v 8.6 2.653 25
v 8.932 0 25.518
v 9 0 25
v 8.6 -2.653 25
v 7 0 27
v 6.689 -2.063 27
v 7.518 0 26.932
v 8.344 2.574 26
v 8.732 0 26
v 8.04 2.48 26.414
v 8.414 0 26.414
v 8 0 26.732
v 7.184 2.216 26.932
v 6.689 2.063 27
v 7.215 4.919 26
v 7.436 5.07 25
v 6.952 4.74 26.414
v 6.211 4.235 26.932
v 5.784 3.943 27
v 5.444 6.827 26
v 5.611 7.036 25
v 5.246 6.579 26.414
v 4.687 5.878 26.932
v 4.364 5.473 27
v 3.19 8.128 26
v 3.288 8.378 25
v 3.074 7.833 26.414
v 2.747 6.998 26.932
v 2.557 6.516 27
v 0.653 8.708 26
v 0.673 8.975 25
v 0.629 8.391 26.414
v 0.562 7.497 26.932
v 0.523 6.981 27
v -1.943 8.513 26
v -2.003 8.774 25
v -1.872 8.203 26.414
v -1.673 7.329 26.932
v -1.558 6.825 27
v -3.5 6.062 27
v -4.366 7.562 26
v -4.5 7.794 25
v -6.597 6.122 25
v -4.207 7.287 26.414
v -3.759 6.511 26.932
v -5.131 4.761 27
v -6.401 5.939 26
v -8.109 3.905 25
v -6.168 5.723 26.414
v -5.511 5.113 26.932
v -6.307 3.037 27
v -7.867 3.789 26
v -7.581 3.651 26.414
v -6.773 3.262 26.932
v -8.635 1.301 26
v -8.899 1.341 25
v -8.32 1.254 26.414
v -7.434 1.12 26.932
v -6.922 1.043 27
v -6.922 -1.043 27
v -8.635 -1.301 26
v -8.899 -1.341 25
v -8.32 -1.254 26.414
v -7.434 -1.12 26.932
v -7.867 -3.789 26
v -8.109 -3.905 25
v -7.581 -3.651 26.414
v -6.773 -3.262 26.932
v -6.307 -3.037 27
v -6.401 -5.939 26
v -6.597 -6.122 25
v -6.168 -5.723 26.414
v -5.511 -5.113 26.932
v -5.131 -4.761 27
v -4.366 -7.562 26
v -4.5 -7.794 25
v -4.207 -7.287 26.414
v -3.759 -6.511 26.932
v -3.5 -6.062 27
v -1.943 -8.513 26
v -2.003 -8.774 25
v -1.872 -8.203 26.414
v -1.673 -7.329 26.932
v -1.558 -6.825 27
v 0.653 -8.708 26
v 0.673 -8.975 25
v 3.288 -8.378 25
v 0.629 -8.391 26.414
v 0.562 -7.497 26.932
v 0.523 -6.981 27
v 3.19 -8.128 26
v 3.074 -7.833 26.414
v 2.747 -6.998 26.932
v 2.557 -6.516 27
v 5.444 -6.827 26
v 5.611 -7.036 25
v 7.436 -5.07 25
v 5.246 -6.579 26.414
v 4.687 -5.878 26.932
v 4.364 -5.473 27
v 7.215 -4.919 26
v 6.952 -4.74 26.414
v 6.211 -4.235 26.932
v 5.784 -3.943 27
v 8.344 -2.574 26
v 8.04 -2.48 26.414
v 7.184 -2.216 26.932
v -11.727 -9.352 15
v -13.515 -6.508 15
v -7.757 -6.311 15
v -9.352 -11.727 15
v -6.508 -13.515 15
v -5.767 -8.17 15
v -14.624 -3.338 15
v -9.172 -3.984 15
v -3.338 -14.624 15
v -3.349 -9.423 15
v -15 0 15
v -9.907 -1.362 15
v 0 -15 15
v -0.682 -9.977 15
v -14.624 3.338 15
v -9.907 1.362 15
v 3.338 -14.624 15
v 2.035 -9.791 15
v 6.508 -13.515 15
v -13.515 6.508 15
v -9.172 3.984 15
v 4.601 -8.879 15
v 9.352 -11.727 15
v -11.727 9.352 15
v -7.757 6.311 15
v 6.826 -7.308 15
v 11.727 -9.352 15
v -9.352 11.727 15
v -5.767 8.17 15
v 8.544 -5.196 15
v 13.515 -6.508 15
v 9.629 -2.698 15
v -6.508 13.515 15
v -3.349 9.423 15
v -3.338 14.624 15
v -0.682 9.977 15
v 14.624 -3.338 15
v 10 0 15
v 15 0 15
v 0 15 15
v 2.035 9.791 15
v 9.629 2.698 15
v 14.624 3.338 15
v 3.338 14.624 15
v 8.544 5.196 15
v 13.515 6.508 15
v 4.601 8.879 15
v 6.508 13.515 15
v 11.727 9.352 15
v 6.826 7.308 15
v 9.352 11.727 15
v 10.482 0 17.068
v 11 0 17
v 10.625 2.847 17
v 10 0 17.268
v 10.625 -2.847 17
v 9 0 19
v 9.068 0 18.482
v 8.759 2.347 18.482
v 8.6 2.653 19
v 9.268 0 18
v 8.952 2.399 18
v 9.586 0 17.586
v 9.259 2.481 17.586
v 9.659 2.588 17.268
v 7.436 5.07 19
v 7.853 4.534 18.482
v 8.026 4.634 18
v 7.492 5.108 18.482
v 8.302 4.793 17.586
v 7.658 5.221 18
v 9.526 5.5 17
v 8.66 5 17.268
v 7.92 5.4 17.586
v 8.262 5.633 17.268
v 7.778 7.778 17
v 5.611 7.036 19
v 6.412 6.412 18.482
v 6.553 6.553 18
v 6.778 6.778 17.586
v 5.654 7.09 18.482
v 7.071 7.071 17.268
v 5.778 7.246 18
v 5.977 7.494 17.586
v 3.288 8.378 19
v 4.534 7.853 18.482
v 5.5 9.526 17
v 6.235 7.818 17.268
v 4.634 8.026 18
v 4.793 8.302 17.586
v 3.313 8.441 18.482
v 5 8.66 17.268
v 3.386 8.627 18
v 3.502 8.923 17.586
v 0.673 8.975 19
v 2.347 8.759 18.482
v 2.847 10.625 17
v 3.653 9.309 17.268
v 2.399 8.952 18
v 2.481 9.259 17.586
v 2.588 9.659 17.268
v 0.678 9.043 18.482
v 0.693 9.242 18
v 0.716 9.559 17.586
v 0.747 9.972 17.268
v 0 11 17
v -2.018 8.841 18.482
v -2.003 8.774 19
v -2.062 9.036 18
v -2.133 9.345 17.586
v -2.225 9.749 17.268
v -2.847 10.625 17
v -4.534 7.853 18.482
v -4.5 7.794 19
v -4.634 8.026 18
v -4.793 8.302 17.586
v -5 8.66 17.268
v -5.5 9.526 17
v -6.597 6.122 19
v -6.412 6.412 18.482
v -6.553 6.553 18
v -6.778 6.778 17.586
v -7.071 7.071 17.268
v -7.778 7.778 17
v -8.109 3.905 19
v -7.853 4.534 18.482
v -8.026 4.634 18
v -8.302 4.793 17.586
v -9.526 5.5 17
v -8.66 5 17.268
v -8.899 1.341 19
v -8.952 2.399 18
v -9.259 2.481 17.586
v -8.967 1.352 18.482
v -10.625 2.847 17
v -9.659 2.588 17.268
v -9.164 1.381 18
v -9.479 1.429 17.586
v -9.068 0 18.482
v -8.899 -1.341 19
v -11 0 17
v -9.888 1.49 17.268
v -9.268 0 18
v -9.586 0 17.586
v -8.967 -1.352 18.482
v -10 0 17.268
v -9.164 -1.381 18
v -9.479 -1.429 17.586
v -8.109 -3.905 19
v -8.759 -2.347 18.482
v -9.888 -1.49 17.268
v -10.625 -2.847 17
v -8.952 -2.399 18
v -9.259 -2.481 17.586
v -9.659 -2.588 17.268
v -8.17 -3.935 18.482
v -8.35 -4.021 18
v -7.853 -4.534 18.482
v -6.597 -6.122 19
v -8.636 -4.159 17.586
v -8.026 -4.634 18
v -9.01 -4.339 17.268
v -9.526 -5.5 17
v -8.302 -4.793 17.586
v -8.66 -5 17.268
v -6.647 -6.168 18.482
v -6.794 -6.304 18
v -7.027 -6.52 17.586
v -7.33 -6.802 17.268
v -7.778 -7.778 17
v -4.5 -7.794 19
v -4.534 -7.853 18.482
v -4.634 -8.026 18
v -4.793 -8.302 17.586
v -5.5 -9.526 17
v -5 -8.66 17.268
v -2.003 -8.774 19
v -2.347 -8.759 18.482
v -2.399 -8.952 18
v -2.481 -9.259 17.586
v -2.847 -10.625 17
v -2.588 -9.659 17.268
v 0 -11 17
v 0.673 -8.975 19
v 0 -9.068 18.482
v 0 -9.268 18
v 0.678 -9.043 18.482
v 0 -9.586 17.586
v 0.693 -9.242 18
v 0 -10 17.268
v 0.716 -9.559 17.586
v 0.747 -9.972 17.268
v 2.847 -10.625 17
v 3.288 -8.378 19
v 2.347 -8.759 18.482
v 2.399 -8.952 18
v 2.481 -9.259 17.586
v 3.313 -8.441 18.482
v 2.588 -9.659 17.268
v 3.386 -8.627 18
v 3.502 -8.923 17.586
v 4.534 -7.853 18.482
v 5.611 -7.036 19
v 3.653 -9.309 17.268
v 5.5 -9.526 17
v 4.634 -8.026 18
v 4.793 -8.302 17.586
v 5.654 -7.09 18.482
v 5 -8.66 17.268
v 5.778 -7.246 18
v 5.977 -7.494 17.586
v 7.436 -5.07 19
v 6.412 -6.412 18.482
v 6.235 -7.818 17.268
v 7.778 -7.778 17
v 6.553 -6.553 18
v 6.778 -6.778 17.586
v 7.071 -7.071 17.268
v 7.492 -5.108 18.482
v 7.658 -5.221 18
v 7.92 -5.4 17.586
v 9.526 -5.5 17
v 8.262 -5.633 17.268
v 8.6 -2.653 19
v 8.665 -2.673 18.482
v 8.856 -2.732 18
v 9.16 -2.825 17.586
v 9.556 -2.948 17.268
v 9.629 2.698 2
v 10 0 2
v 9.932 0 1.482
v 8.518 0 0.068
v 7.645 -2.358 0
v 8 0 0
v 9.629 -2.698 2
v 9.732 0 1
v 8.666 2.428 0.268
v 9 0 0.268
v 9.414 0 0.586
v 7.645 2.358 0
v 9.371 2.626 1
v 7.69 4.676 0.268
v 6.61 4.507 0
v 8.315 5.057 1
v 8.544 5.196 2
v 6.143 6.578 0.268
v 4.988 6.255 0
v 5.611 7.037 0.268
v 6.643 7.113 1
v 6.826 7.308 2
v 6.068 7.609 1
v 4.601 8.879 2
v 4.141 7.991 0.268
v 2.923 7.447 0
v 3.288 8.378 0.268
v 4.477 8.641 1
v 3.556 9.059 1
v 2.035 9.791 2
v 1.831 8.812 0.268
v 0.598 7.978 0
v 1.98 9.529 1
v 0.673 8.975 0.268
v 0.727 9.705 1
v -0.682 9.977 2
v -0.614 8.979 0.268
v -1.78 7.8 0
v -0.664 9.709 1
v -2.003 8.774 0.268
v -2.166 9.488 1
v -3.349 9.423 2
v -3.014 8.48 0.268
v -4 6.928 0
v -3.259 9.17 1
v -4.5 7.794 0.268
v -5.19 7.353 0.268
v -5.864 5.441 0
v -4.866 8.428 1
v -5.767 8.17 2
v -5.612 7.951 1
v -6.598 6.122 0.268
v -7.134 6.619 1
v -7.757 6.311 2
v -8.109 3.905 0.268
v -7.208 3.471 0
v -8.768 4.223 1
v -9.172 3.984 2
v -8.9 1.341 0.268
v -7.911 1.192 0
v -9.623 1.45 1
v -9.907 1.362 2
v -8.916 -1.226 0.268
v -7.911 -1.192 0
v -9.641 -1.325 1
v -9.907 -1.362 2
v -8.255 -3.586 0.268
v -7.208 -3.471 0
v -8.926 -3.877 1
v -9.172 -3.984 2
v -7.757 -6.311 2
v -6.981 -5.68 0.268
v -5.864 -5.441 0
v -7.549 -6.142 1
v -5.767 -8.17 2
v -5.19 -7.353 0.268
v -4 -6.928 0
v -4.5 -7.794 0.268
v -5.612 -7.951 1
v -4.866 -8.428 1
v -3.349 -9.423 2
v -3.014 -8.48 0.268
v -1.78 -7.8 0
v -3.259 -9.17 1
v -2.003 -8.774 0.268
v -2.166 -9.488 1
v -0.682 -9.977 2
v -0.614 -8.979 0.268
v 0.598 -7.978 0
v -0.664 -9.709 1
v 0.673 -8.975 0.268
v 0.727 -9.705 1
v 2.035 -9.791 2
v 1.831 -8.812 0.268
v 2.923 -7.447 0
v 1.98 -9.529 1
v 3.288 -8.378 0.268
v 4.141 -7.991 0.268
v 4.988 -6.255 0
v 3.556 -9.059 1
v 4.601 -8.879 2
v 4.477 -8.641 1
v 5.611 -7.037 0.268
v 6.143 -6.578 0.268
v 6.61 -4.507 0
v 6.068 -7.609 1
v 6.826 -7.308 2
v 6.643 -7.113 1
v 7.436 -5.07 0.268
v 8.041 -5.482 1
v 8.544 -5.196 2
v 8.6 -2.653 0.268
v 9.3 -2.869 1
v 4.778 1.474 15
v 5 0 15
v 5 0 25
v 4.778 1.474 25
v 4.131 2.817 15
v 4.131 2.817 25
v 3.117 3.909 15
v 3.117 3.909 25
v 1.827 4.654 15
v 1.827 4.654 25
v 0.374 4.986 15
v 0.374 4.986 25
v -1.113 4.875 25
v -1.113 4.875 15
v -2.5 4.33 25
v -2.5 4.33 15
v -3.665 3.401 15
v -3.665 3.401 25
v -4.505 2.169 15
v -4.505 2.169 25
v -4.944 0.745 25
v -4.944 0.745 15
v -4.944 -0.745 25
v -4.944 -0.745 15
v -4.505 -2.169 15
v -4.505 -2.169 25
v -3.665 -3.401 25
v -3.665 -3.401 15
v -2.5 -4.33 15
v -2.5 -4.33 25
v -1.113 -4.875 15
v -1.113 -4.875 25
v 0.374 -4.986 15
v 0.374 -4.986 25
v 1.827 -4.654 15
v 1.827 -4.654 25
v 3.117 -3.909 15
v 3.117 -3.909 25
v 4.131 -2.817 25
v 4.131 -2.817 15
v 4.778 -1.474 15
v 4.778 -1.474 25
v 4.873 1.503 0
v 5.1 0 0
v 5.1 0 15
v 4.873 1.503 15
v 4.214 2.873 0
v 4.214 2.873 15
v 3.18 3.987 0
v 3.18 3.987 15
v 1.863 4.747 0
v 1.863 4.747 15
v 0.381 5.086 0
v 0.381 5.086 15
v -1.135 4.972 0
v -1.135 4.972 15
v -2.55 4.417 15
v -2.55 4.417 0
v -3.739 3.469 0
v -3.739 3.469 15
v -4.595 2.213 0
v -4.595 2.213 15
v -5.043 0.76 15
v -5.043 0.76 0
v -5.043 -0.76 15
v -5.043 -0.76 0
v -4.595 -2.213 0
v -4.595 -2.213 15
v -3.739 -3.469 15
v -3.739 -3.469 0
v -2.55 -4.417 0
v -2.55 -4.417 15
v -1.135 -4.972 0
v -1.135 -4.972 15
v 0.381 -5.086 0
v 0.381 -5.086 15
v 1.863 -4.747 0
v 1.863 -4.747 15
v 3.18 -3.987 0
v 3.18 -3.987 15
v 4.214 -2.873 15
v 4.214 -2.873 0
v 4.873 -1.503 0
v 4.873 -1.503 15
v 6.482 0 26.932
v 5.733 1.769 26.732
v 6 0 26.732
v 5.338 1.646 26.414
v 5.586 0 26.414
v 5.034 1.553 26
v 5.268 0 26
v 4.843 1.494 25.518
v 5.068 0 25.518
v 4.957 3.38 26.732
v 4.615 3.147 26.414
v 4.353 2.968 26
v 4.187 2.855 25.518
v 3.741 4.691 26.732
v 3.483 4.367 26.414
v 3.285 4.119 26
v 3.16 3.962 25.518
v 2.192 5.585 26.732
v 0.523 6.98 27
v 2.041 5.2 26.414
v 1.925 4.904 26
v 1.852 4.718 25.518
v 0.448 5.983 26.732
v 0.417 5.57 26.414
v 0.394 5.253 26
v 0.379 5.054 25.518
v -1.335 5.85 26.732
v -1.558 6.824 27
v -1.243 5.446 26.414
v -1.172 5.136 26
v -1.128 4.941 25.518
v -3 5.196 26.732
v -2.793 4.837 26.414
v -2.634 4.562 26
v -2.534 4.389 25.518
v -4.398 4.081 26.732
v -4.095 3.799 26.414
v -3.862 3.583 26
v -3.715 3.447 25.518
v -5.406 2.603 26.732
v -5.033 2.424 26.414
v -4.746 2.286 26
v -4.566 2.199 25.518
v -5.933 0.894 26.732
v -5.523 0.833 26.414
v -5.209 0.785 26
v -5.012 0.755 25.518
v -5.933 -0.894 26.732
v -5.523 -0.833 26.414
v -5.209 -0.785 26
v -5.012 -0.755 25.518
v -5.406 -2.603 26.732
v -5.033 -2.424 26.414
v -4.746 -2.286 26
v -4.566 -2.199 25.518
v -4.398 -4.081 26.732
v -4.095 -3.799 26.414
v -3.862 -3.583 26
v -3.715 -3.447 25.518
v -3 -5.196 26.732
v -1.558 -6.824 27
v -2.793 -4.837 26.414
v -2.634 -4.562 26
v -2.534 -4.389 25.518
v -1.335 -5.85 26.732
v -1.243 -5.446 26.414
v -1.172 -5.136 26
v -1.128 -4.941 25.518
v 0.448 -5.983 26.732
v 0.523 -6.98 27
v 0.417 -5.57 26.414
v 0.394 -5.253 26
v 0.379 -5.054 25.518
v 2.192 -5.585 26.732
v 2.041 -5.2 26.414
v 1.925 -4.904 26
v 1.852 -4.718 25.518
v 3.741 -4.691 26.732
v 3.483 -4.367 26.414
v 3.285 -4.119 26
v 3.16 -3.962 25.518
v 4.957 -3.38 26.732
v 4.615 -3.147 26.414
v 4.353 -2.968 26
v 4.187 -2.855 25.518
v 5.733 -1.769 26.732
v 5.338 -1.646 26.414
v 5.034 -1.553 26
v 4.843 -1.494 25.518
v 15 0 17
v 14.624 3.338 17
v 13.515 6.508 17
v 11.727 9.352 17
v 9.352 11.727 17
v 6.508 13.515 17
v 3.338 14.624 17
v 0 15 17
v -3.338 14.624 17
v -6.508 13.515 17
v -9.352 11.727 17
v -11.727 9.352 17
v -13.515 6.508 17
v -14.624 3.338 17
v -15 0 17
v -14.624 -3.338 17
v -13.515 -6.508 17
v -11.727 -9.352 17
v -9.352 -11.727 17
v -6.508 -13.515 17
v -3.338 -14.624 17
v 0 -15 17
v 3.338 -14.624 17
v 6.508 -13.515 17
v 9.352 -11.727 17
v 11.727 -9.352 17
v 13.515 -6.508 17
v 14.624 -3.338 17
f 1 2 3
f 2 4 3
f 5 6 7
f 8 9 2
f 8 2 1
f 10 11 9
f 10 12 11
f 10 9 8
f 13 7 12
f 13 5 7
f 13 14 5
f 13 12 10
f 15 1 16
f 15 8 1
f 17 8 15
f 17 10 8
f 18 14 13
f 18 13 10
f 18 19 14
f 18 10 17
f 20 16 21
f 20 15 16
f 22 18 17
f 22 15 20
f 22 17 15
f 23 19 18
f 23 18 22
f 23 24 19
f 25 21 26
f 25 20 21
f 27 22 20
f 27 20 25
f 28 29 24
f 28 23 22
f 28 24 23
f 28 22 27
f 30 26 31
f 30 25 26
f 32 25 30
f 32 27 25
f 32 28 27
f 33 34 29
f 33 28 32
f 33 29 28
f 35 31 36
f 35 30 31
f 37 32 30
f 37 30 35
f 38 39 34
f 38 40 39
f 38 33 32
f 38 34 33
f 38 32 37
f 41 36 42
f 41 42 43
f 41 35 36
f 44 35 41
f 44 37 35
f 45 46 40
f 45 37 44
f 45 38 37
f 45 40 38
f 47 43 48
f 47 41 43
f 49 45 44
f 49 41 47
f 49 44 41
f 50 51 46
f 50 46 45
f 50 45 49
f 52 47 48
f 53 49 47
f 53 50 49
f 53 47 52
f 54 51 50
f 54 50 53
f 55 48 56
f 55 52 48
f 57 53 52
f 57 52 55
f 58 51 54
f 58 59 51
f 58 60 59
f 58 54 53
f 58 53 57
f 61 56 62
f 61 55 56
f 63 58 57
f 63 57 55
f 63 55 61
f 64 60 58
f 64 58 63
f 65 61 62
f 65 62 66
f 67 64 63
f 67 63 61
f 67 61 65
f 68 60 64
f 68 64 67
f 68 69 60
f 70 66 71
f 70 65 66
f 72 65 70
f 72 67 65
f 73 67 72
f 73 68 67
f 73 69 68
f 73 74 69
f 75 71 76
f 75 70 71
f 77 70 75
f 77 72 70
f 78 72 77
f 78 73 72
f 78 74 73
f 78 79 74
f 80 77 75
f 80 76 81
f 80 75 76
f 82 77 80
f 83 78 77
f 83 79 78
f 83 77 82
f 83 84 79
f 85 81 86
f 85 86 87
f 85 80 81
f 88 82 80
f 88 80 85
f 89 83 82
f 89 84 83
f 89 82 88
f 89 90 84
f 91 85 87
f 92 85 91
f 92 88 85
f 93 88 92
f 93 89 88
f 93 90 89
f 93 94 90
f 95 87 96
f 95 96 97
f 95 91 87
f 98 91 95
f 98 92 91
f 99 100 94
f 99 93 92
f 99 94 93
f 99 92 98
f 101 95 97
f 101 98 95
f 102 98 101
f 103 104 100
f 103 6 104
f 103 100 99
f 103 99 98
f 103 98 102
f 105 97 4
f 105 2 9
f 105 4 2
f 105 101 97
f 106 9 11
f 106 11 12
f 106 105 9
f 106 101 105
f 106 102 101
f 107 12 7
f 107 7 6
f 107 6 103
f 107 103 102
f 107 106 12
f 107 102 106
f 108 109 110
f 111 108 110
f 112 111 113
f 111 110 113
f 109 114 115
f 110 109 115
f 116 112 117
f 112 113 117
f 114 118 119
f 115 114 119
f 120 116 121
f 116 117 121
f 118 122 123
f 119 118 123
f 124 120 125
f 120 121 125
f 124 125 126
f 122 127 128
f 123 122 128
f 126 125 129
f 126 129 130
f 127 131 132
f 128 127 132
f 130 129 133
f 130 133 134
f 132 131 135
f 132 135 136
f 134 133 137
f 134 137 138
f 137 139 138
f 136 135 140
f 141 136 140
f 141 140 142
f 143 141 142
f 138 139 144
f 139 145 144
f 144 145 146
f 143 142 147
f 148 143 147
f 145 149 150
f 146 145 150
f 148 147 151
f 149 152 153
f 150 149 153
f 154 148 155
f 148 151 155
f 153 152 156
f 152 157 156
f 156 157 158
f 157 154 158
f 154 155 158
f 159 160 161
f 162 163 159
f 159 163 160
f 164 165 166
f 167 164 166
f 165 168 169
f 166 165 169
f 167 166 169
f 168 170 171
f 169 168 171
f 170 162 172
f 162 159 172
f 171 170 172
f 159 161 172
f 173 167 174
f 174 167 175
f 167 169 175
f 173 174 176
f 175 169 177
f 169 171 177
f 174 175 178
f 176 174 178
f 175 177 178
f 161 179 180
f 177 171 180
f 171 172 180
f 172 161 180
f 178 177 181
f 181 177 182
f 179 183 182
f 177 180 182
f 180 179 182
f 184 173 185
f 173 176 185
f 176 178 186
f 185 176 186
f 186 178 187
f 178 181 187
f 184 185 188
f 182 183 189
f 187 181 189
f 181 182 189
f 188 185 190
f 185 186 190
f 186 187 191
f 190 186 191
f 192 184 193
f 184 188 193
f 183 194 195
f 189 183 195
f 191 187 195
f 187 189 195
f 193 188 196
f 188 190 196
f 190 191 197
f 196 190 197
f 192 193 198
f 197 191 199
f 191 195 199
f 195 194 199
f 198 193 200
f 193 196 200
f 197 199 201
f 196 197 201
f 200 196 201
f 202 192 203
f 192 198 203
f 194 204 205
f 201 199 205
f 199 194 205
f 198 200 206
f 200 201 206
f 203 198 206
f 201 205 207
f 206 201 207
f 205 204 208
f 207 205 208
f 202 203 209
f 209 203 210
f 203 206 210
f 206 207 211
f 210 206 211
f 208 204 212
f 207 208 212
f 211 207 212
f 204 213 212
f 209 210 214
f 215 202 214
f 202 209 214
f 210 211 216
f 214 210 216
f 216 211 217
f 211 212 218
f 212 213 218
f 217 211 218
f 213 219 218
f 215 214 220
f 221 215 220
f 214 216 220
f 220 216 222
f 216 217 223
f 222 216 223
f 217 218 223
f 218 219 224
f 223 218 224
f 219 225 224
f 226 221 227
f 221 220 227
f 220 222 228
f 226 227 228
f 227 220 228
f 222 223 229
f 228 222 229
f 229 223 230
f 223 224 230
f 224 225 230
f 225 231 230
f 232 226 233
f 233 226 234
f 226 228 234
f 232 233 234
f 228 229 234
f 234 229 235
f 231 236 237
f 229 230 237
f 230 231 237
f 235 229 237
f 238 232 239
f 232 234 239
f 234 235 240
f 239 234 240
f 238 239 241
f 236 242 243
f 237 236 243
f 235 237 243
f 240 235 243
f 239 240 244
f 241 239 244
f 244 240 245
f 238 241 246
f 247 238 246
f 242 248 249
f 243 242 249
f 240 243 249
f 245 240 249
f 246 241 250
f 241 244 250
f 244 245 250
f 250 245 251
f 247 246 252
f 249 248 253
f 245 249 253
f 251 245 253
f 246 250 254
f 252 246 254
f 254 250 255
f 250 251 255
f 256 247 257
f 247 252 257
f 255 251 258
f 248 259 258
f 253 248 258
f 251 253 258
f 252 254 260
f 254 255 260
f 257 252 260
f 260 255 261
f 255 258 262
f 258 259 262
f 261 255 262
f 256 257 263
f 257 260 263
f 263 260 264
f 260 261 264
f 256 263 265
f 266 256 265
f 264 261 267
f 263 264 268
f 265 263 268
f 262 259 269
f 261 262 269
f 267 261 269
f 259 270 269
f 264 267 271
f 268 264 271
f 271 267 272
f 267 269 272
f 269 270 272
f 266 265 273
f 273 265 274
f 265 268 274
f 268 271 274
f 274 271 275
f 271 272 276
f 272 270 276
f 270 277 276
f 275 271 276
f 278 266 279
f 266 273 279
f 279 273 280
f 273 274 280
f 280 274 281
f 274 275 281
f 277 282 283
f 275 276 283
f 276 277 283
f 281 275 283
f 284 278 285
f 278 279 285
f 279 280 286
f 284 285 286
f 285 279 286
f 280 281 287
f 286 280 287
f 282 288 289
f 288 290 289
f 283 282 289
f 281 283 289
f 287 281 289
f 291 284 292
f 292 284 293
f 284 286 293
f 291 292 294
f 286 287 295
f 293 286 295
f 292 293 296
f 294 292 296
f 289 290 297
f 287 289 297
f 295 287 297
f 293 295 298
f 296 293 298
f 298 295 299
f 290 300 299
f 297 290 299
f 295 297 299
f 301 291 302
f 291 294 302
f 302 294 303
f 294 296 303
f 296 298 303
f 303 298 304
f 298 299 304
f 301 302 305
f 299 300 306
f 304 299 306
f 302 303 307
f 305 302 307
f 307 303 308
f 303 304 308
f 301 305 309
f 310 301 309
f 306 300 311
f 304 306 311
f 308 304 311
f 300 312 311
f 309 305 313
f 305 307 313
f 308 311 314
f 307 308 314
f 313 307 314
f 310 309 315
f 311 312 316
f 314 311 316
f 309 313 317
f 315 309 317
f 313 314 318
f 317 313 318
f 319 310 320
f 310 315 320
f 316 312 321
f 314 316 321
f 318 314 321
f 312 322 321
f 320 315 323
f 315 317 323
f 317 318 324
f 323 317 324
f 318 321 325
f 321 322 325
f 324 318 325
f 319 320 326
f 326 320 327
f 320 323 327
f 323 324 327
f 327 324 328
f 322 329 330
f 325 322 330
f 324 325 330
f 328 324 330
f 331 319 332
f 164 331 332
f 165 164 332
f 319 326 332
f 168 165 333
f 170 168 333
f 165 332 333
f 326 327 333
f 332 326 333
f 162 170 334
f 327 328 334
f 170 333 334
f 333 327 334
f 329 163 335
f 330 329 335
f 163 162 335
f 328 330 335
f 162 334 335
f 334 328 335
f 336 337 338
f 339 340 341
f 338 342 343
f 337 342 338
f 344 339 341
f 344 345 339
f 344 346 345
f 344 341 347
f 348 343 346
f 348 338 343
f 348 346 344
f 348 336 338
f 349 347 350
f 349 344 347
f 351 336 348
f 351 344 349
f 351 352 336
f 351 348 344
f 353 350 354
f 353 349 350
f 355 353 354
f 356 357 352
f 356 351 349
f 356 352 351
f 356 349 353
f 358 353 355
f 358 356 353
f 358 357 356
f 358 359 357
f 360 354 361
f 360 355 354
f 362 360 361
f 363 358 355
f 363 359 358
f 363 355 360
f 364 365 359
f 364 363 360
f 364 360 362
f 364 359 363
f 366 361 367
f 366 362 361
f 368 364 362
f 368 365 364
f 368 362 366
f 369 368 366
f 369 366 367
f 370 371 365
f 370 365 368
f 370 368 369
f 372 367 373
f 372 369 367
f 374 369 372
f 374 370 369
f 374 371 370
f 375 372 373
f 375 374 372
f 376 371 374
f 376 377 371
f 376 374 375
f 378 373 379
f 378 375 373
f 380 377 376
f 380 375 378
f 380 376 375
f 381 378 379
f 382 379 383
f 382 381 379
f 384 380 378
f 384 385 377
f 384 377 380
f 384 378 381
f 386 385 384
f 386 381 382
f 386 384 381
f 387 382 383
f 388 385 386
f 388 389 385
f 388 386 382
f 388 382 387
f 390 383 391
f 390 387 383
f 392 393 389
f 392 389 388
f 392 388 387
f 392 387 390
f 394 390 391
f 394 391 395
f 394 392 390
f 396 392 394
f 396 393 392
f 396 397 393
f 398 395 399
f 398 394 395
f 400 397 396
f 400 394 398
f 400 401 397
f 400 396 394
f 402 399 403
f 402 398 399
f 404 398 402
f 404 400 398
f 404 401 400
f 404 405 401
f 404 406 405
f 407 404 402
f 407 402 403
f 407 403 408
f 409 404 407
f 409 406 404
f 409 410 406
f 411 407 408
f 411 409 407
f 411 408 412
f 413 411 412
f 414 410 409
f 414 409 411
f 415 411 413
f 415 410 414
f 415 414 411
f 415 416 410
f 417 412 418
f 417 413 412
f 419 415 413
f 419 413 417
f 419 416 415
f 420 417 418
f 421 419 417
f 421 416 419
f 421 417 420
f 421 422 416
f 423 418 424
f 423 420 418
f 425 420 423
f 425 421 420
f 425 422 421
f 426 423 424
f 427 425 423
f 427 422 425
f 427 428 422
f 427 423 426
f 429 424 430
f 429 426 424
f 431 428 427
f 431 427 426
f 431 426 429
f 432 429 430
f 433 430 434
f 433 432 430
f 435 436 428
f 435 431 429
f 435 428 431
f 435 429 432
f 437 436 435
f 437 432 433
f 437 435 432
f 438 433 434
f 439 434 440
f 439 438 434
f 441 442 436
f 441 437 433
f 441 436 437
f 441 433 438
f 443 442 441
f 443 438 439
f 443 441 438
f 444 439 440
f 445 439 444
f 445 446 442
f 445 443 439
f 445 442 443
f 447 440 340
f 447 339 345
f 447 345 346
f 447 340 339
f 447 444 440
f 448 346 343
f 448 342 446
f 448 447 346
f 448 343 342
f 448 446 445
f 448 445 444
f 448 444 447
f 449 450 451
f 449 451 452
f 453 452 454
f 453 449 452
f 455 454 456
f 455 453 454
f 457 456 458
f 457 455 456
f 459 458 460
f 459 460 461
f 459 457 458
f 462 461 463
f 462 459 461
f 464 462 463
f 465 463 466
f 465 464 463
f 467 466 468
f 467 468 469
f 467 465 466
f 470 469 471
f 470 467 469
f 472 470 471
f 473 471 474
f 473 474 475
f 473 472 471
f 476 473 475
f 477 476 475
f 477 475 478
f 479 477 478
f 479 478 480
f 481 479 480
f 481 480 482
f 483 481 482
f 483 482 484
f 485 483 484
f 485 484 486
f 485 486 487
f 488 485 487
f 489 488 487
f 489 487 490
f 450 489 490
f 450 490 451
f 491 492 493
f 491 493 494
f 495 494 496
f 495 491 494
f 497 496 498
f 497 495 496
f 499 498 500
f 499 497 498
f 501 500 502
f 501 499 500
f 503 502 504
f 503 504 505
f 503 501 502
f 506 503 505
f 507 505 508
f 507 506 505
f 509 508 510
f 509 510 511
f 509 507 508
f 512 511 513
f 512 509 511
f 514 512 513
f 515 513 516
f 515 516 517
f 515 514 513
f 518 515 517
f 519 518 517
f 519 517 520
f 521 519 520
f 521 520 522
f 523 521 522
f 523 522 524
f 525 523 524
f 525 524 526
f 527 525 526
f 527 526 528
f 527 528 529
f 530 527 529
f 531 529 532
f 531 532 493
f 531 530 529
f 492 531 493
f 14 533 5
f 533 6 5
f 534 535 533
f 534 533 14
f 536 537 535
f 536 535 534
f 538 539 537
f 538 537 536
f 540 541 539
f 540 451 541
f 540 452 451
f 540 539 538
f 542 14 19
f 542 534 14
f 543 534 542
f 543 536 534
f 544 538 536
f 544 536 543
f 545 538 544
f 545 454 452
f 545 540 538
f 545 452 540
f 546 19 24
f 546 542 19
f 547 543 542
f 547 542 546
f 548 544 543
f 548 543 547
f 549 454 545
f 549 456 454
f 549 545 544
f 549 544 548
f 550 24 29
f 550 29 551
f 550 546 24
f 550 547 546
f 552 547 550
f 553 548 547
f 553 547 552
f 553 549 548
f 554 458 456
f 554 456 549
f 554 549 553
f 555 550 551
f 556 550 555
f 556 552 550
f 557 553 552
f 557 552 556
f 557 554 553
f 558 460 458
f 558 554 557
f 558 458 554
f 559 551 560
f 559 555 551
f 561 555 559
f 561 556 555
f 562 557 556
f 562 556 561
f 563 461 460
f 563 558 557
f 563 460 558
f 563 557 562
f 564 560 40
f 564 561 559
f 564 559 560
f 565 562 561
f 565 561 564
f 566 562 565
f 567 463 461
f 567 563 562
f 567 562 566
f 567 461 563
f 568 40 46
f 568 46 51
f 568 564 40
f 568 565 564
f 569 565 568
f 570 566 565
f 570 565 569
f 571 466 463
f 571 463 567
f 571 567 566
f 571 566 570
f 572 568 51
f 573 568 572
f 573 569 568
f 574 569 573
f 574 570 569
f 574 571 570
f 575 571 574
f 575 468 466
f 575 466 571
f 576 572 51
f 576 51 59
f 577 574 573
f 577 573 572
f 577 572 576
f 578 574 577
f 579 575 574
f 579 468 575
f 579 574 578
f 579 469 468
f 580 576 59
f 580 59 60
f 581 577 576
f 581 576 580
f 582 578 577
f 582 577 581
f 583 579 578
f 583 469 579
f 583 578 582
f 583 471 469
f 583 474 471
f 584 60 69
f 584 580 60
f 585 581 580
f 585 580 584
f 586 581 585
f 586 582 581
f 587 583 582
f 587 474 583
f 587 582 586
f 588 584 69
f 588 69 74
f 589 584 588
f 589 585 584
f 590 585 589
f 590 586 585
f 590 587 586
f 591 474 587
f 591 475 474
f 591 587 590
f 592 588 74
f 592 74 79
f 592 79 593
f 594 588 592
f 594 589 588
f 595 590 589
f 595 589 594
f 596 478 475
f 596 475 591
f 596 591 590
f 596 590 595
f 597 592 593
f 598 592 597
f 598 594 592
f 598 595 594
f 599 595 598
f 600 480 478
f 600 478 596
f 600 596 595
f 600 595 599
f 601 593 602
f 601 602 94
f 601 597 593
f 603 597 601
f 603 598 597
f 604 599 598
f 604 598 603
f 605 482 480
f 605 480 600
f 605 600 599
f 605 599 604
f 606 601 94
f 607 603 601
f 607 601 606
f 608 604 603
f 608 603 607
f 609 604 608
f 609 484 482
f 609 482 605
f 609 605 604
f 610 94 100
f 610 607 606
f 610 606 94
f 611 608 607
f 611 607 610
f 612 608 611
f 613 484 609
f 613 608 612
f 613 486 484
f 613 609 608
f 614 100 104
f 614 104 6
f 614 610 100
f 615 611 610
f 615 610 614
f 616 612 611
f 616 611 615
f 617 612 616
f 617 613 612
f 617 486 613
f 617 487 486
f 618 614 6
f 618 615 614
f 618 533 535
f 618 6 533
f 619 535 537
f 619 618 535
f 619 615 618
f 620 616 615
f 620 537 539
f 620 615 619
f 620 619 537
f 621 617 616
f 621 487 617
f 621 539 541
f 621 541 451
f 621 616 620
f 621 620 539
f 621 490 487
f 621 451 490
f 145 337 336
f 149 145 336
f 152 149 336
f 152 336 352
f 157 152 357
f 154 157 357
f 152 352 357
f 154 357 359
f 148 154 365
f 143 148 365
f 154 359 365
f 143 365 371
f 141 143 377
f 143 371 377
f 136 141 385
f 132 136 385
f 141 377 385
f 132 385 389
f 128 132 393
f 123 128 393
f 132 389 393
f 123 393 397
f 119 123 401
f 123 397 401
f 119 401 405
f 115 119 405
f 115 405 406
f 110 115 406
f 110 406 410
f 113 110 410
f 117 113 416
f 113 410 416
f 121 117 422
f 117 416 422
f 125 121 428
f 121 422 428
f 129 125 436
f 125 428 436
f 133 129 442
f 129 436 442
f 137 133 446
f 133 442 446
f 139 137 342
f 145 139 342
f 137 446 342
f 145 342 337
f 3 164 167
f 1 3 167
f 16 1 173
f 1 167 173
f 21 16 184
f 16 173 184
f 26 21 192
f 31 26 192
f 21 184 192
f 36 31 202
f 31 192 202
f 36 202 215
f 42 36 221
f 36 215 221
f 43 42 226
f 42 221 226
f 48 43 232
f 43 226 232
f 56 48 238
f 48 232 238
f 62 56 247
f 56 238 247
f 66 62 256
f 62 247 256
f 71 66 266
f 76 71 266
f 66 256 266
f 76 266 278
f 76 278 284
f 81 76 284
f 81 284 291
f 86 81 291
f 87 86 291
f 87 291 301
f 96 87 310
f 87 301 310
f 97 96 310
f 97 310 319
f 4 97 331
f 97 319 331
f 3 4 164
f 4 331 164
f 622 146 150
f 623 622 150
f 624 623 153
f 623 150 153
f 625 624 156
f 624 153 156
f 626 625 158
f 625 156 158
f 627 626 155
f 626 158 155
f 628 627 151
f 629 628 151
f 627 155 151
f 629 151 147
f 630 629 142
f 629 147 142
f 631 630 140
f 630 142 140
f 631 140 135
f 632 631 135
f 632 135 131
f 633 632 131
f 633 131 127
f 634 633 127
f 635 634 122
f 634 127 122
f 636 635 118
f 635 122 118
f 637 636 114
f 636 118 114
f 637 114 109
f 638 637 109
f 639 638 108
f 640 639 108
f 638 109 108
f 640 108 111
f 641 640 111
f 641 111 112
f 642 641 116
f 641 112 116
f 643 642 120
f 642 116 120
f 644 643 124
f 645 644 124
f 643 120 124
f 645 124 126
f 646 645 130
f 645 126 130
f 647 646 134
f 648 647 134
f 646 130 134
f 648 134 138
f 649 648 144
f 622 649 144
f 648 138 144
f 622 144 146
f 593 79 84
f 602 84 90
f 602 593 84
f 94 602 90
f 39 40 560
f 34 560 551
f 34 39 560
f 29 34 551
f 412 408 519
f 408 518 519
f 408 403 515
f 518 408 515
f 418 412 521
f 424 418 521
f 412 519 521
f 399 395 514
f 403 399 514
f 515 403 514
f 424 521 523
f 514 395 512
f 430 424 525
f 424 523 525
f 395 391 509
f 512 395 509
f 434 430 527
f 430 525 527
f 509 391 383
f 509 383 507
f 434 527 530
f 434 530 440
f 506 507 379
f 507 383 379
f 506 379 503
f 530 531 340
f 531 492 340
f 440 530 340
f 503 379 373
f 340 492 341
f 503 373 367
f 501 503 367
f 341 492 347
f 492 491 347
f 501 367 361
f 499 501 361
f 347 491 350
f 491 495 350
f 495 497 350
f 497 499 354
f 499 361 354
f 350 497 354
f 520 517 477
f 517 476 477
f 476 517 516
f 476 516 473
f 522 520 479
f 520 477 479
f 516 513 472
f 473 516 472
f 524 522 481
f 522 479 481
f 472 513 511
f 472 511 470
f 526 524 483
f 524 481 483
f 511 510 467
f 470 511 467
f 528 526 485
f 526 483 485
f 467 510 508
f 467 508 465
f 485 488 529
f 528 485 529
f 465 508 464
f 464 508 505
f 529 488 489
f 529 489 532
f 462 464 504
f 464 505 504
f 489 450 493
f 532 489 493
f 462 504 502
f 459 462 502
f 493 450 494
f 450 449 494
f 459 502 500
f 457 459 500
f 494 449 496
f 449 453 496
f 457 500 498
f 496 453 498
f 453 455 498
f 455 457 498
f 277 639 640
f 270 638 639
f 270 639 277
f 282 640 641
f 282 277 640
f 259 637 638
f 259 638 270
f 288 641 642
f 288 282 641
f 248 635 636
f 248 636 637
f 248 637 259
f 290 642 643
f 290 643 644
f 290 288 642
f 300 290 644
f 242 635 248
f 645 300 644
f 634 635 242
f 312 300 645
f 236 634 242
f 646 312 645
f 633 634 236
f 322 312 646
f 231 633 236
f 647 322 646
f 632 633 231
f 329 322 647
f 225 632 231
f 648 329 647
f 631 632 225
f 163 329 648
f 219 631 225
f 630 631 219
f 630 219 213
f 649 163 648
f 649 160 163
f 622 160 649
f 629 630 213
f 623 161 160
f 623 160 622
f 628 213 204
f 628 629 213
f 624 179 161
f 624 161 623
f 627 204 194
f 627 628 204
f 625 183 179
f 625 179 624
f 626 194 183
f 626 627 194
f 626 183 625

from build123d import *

# Parameters (mm, degrees)
SKETCH_1_R      = 10
SKETCH_1_R_2    = 5.1
EXTRUDE_1_DEPTH = 15
SKETCH_2_R      = 15
SKETCH_2_R_2    = 5
EXTRUDE_2_DEPTH = 2
SKETCH_3_R      = 9
SKETCH_3_R_2    = 5
EXTRUDE_3_DEPTH = 10
FILLET_1_R      = 2


with BuildPart() as part:
    # 草图1 → 凸台-拉伸1 (new body)
    with BuildSketch(Plane.XY):
        Circle(SKETCH_1_R)
        Circle(SKETCH_1_R_2, mode=Mode.SUBTRACT)
    extrude(amount=EXTRUDE_1_DEPTH)

    # 草图2 → 凸台-拉伸2 (add)
    with BuildSketch(Plane.XY.offset(15)):
        Circle(SKETCH_2_R)
        Circle(SKETCH_2_R_2, mode=Mode.SUBTRACT)
    extrude(amount=EXTRUDE_2_DEPTH)

    # 草图3 → 凸台-拉伸3 (add)
    with BuildSketch(Plane.XY.offset(17)):
        Circle(SKETCH_3_R)
        Circle(SKETCH_3_R_2, mode=Mode.SUBTRACT)
    extrude(amount=EXTRUDE_3_DEPTH)

    # 圆角1
    fillet_1_edges = [part.edges().sort_by_distance(p)[0] for p in [
        (-9, 0, 17),
        (-9, 0, 27),
        (-5, 0, 27),
        (-10, 0, 0),
    ]]
    fillet(fillet_1_edges, radius=FILLET_1_R - 0.0001)  # a hair under: the kernel refuses the full size


solid = part.part
